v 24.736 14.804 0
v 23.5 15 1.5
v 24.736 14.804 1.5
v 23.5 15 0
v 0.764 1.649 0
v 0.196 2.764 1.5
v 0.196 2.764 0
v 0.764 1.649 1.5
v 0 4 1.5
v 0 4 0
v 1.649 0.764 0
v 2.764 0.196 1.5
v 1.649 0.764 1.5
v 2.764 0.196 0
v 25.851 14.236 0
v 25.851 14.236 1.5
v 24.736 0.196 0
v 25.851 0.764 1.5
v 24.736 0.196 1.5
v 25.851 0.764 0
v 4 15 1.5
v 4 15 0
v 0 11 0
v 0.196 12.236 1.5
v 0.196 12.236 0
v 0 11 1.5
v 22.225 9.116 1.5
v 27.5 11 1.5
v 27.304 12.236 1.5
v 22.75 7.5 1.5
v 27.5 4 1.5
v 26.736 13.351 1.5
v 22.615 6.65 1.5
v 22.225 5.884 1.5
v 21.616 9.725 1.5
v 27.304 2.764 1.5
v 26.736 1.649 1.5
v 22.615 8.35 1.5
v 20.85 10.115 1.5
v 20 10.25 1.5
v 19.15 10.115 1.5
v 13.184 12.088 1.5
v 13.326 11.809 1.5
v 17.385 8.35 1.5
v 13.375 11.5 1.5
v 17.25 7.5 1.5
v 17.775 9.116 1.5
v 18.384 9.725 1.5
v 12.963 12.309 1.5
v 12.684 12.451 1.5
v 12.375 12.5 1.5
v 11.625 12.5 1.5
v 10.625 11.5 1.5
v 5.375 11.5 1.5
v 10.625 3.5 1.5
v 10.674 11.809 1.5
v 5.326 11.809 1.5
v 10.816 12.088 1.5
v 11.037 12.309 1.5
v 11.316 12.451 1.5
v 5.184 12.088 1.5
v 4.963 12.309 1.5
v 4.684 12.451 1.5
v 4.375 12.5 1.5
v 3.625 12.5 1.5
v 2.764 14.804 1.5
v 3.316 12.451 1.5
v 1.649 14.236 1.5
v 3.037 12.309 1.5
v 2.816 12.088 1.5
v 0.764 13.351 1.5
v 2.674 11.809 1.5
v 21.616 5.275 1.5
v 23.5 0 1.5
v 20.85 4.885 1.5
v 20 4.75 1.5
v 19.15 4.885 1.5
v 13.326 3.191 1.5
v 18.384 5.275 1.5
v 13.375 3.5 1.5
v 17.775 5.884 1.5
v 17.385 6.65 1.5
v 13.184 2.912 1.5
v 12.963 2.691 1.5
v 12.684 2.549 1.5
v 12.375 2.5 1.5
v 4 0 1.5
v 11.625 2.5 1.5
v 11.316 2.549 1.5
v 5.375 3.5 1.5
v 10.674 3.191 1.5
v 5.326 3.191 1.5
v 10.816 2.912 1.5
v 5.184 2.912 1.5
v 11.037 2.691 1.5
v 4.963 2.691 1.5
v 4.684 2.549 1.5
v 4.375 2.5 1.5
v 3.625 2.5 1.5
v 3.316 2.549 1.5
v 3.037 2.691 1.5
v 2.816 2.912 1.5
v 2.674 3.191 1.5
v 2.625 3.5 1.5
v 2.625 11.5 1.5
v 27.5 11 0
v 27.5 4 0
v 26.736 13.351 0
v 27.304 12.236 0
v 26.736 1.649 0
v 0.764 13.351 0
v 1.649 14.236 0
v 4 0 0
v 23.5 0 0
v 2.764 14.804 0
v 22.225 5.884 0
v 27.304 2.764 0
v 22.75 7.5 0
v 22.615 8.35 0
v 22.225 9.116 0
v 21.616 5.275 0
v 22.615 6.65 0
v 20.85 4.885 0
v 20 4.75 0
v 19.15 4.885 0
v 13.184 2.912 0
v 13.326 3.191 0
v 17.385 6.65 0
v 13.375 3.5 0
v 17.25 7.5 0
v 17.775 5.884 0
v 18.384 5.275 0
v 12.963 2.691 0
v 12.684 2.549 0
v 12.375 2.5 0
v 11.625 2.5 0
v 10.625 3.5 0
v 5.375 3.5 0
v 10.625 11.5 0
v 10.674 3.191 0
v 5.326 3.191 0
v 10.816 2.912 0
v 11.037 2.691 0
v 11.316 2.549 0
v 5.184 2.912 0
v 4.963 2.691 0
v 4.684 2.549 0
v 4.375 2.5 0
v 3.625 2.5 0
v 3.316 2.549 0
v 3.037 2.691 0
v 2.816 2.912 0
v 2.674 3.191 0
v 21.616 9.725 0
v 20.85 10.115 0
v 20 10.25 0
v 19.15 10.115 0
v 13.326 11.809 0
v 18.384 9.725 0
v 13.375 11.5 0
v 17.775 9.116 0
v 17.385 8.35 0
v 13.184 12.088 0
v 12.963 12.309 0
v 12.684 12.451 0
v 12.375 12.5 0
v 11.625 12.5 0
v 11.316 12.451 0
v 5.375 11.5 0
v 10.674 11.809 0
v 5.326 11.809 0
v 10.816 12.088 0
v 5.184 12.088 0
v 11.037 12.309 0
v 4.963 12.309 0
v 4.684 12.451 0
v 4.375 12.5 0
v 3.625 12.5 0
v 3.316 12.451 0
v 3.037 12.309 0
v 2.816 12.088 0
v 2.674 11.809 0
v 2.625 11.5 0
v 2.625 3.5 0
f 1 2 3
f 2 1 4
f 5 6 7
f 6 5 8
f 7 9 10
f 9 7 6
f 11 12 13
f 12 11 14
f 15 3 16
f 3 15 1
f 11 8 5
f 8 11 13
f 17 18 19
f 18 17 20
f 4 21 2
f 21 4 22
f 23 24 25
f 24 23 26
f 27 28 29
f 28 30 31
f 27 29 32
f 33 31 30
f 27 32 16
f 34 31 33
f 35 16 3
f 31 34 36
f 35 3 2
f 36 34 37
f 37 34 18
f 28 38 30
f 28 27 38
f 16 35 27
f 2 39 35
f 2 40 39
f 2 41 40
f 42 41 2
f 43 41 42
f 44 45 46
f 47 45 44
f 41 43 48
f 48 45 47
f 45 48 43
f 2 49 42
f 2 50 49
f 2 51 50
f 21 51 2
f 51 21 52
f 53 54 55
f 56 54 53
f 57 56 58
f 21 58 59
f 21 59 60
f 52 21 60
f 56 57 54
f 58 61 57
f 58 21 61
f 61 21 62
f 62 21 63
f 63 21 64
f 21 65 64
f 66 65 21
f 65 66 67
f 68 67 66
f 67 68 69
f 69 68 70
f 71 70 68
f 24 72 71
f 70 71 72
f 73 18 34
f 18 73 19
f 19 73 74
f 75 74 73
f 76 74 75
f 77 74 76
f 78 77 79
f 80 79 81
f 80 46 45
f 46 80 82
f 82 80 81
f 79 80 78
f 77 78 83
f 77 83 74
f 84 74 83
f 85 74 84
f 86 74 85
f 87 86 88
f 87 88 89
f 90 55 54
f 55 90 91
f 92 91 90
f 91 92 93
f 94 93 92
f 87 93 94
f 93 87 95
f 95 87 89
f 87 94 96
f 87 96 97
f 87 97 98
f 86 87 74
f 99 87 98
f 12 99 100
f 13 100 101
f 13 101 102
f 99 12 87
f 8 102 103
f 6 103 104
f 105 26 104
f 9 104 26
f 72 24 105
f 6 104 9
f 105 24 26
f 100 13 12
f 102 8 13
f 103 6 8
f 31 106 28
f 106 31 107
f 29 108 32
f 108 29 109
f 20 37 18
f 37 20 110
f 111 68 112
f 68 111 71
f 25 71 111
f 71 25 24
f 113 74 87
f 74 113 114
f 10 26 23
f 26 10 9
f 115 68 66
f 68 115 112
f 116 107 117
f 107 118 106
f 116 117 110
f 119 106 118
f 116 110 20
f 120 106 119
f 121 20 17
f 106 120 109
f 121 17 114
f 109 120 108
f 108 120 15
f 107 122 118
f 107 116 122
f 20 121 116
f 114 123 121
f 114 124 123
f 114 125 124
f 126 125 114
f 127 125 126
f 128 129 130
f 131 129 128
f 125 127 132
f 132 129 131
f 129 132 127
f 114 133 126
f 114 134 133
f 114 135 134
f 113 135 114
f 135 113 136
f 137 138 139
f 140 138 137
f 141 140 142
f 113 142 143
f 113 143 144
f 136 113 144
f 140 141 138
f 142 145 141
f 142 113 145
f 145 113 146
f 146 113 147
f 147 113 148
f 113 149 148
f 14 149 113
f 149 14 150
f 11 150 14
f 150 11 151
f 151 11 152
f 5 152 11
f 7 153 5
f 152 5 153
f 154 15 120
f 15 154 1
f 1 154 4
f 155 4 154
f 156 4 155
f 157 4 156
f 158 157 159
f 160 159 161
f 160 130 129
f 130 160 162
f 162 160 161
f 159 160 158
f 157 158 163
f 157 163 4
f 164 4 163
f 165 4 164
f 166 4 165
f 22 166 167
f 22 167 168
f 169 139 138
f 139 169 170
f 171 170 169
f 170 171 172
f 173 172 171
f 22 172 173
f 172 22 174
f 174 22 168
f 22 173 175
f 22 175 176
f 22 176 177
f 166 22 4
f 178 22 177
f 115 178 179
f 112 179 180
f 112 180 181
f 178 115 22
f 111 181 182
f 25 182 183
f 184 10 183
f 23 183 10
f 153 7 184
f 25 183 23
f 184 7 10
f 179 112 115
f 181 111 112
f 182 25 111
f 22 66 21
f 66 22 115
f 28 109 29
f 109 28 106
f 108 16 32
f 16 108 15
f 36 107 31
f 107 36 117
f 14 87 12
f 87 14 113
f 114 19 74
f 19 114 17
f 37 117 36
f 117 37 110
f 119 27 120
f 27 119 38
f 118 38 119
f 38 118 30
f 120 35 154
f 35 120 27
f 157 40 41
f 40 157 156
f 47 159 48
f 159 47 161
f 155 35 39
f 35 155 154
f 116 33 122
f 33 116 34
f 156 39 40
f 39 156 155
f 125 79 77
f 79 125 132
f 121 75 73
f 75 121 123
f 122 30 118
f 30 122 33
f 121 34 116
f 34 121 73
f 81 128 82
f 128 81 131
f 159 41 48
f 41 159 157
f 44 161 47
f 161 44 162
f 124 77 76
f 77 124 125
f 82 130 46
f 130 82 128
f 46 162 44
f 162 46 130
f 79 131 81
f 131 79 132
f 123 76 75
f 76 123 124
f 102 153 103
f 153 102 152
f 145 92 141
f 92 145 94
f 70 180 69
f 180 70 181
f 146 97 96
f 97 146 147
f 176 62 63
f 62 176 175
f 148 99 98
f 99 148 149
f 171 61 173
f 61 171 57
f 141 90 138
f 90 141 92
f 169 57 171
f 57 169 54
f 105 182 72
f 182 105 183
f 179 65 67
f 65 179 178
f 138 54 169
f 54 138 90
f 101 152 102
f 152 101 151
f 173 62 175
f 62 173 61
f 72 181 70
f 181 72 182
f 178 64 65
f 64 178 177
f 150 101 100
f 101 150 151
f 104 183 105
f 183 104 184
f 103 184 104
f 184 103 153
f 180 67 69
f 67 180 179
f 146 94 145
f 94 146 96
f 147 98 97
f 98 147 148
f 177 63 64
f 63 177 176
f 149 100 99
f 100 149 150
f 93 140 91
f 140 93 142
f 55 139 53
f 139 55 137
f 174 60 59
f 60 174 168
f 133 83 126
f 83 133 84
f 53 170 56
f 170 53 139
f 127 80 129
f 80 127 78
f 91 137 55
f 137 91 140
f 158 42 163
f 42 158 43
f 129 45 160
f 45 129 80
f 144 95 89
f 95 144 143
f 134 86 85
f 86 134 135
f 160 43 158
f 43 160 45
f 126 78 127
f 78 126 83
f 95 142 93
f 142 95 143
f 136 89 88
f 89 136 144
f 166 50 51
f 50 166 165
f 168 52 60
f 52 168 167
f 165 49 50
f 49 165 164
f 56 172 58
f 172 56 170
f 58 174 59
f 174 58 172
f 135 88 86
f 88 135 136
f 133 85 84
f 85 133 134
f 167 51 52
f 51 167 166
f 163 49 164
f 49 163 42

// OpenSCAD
//width of the belt
beltwidth = 9;
// thickness of belt
thickness = 1.75;

module roundedRect(size, radius) {
 x = size[0];
 y = size[1];
 z = size[2];

 linear_extrude(height=z)
 hull() {
	translate([radius, radius, 0])
	circle(r=radius, $fn=20);
	
	translate([x - radius, radius, 0])
	circle(r=radius, $fn=20);
	
	translate([x - radius, y - radius, 0])
	circle(r=radius, $fn=20);
	
	translate([radius, y - radius, 0])
	circle(r=radius, $fn=20);
 }
}

difference()
{
	roundedRect([27.5,15,1.5],4);
	
	translate([20,7.5,-0.25])
	cylinder(r=2.75, h=2, $fn=20);
	
	translate([4-2.75/2,2.5,-0.25])
	roundedRect([1+thickness,1+beltwidth,2],1);

	translate([12-2.75/2,2.5,-0.25])
	roundedRect([1+thickness,1+beltwidth,2],1);
}
